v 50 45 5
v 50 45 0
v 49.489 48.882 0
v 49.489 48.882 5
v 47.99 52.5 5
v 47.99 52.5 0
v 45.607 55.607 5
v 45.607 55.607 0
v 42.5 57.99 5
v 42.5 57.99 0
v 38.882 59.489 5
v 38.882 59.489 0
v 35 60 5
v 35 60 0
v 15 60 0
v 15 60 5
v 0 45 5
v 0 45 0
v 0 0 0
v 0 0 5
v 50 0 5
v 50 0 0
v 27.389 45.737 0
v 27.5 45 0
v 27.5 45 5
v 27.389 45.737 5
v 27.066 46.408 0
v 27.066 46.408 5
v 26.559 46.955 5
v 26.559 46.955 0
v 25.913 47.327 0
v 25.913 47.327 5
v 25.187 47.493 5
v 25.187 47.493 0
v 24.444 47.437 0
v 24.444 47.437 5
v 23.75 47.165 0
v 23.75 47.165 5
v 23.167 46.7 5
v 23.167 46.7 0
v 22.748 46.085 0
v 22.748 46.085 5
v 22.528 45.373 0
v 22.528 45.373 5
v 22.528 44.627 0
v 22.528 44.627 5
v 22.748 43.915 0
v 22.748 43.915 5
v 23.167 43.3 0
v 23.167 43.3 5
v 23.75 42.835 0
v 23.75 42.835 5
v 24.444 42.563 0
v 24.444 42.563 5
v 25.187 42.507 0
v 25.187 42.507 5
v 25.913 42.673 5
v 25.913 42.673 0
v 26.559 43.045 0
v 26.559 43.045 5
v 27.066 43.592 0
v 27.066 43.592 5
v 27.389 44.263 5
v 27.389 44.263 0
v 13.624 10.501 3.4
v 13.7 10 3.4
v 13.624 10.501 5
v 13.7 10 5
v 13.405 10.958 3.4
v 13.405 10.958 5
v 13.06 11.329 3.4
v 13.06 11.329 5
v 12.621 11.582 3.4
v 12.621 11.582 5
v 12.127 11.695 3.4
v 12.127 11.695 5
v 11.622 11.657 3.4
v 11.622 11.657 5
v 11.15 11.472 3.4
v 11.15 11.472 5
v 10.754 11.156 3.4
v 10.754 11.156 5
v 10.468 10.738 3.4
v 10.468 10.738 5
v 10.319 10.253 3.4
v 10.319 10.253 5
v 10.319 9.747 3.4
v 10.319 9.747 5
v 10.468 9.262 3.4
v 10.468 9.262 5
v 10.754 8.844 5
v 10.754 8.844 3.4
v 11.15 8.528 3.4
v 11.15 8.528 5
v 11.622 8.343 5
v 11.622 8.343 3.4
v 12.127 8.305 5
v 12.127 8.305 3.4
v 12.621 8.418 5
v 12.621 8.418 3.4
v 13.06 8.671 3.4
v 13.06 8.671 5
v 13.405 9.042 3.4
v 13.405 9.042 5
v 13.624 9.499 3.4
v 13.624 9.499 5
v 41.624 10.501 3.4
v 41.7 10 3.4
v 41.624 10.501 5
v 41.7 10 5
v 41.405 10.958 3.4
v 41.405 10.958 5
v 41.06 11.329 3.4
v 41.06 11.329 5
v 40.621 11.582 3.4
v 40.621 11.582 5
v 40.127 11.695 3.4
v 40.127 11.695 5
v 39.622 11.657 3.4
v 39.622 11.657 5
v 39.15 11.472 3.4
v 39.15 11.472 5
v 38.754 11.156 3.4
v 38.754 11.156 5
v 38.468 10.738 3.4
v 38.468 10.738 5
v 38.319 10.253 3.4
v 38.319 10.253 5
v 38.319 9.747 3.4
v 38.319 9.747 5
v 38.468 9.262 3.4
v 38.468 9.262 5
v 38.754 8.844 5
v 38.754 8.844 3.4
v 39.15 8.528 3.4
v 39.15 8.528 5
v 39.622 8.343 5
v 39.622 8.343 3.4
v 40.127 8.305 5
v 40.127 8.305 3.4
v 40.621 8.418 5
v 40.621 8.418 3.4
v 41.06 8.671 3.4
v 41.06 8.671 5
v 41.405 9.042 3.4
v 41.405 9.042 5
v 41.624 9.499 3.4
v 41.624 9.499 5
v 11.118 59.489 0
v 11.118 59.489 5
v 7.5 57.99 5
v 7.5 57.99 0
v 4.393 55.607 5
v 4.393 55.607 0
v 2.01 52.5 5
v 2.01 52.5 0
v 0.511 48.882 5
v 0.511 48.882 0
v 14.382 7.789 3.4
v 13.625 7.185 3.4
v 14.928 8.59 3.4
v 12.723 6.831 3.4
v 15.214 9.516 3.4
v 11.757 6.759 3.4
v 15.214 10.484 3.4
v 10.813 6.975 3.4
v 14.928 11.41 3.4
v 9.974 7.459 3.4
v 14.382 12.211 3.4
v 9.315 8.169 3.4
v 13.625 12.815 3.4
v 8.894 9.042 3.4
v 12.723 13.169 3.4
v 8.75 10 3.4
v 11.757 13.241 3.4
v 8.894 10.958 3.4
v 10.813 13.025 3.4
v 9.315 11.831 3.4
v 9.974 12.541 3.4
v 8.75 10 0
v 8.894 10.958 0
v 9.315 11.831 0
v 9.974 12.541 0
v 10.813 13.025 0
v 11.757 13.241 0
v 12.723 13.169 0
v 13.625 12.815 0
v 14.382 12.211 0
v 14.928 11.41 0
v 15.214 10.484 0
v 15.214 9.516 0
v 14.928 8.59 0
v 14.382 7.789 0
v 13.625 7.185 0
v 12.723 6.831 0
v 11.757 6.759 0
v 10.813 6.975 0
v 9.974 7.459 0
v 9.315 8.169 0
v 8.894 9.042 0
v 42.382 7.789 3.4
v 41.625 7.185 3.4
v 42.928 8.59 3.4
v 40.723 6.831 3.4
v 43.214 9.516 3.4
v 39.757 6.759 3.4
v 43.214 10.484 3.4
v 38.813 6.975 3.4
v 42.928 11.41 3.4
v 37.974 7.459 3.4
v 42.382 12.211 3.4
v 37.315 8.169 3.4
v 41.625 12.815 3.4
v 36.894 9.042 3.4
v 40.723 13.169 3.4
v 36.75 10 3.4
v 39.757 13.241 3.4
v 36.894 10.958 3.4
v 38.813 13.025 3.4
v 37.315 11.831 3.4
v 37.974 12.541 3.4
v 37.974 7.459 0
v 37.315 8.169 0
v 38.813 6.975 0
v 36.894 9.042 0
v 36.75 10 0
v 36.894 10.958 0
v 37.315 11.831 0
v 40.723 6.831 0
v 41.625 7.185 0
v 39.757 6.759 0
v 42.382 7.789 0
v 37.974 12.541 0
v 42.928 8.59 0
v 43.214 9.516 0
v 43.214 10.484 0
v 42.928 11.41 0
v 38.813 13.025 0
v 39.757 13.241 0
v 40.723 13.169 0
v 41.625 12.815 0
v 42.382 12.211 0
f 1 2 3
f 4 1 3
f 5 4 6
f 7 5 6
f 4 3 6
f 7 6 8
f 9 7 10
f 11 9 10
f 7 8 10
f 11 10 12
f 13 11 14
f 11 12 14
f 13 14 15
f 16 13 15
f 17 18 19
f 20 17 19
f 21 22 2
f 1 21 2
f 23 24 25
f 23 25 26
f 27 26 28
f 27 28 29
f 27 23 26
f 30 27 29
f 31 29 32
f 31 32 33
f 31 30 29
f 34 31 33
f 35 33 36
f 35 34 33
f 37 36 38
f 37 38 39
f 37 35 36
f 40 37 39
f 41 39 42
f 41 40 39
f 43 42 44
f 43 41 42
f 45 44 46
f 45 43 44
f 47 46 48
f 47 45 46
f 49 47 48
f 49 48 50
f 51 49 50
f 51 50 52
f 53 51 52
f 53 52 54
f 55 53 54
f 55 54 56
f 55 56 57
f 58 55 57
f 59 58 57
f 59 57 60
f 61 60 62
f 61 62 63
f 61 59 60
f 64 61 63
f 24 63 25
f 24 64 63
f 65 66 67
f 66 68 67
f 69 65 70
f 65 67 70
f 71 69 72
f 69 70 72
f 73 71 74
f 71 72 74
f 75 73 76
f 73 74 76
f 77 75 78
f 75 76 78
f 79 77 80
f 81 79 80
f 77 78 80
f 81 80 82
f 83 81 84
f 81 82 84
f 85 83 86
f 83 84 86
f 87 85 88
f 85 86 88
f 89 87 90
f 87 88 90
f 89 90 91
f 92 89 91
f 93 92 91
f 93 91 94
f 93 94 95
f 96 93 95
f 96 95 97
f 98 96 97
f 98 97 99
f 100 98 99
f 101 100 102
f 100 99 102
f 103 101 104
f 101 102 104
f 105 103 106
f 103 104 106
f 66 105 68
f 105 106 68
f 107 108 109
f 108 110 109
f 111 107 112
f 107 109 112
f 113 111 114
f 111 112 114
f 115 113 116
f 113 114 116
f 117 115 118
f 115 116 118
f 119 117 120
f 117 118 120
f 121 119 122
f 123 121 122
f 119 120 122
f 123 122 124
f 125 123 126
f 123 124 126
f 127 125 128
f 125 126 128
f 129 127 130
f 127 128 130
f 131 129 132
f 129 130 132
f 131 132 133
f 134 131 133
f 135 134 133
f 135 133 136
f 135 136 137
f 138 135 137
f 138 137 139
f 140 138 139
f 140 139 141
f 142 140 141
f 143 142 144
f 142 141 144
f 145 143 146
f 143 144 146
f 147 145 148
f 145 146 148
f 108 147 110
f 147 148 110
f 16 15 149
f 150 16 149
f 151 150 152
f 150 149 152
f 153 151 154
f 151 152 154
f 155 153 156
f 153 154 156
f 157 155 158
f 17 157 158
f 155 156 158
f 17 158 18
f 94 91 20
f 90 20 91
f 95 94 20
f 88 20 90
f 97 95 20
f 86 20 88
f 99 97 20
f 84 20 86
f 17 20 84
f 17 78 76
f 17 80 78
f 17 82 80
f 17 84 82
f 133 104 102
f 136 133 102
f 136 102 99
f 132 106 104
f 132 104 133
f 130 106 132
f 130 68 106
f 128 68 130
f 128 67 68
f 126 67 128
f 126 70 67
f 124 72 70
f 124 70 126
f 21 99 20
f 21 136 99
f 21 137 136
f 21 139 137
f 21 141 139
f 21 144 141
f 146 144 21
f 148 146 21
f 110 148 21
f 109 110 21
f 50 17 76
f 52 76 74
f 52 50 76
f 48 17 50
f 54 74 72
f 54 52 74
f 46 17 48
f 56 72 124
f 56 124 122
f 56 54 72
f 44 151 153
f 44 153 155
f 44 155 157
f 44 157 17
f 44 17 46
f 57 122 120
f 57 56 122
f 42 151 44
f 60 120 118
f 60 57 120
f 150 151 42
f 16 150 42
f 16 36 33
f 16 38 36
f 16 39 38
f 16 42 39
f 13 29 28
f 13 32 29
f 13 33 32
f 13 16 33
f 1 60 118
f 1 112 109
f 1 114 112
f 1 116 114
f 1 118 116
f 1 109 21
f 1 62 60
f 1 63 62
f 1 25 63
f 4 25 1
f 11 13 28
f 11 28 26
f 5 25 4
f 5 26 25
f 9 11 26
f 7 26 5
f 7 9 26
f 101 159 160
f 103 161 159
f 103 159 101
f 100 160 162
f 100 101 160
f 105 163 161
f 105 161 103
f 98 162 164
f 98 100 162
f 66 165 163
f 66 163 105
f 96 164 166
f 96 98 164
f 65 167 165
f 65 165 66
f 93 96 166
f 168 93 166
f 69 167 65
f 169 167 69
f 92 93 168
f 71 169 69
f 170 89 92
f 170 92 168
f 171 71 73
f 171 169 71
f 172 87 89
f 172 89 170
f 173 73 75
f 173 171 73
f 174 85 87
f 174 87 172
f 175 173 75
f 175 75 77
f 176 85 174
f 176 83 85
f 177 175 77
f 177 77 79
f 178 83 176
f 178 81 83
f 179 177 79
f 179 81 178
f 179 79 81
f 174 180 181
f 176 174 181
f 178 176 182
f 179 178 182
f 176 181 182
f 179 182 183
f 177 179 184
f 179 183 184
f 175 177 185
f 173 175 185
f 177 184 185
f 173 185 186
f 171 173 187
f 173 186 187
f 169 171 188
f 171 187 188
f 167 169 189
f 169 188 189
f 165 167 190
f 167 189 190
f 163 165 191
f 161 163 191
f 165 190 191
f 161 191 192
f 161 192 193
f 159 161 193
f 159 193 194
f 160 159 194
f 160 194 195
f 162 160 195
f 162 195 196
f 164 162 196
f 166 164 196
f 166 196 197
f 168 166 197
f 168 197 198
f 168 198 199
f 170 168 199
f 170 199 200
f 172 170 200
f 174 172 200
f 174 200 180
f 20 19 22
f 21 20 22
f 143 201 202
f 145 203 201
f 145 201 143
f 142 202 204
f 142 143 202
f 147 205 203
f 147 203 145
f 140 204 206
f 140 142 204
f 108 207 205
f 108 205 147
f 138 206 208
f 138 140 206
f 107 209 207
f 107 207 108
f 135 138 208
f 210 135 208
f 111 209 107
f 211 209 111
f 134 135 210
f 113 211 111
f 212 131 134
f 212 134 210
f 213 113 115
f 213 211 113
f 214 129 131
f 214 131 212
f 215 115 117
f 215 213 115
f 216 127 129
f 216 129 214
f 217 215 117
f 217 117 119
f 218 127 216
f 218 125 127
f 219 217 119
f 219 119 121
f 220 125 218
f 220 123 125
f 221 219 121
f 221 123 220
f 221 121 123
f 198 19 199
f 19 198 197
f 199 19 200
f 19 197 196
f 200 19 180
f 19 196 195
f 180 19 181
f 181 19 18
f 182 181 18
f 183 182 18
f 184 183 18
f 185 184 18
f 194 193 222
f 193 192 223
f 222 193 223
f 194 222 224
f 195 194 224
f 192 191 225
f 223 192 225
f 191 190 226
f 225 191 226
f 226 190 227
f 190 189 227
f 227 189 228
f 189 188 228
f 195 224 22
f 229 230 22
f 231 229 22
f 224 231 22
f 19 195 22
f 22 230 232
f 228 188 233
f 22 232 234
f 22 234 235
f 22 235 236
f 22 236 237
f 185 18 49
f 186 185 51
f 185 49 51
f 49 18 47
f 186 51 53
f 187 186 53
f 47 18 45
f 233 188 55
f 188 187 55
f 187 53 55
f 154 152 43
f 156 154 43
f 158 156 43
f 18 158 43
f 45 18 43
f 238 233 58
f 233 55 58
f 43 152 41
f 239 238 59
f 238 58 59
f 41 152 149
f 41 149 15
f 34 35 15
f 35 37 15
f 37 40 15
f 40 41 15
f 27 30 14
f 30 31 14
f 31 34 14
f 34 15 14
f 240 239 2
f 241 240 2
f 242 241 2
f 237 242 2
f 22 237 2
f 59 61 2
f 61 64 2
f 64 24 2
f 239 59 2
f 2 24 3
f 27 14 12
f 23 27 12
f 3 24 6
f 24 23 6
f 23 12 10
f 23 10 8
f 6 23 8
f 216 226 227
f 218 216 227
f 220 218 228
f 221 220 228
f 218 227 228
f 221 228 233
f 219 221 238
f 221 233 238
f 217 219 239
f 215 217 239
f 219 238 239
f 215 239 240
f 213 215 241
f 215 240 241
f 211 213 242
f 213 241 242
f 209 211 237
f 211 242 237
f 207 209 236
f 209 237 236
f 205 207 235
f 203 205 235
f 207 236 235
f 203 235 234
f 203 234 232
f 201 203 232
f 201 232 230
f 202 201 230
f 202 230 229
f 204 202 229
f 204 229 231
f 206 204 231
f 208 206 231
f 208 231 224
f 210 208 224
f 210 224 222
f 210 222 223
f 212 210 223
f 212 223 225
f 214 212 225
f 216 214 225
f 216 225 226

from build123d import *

# Parameters (mm, degrees)
SKIZZE1_R                                            = 2.5
AUFSATZ_LINEAR_AUSTRAGEN1_DEPTH                      = 5
STIRNSENKUNG_F_R_M3_ZYLINDERSCHRAUBE_MIT_D           = 3.4
STIRNSENKUNG_F_R_M3_ZYLINDERSCHRAUBE_MIT_CBORE_D     = 6.5
STIRNSENKUNG_F_R_M3_ZYLINDERSCHRAUBE_MIT_CBORE_DEPTH = 3.4


with BuildPart() as part:
    # Skizze1 → Aufsatz-Linear austragen1 (new body)
    with BuildSketch(Plane.XY):
        with BuildLine():
            Line((0, 0), (50, 0))
            Line((50, 0), (50, 45))
            ThreePointArc((50, 45), (45.606601718, 55.606601718), (35, 60))
            Line((35, 60), (15, 60))
            ThreePointArc((15, 60), (4.393398282, 55.606601718), (0, 45))
            Line((0, 45), (0, 0))
        make_face()
        with Locations((25, 45)):
            Circle(SKIZZE1_R, mode=Mode.SUBTRACT)
    extrude(amount=AUFSATZ_LINEAR_AUSTRAGEN1_DEPTH)

    # Stirnsenkung für M3 Zylinderschraube mit Innensechskant2 (through all)
    with Locations(Plane(origin=(0, 0, 0), x_dir=(-1, 0, 0), z_dir=(0, 0, -1))):
        with Locations((-40, 10), (-12, 10)):
            CounterBoreHole(STIRNSENKUNG_F_R_M3_ZYLINDERSCHRAUBE_MIT_D / 2, STIRNSENKUNG_F_R_M3_ZYLINDERSCHRAUBE_MIT_CBORE_D / 2, STIRNSENKUNG_F_R_M3_ZYLINDERSCHRAUBE_MIT_CBORE_DEPTH)


solid = part.part
